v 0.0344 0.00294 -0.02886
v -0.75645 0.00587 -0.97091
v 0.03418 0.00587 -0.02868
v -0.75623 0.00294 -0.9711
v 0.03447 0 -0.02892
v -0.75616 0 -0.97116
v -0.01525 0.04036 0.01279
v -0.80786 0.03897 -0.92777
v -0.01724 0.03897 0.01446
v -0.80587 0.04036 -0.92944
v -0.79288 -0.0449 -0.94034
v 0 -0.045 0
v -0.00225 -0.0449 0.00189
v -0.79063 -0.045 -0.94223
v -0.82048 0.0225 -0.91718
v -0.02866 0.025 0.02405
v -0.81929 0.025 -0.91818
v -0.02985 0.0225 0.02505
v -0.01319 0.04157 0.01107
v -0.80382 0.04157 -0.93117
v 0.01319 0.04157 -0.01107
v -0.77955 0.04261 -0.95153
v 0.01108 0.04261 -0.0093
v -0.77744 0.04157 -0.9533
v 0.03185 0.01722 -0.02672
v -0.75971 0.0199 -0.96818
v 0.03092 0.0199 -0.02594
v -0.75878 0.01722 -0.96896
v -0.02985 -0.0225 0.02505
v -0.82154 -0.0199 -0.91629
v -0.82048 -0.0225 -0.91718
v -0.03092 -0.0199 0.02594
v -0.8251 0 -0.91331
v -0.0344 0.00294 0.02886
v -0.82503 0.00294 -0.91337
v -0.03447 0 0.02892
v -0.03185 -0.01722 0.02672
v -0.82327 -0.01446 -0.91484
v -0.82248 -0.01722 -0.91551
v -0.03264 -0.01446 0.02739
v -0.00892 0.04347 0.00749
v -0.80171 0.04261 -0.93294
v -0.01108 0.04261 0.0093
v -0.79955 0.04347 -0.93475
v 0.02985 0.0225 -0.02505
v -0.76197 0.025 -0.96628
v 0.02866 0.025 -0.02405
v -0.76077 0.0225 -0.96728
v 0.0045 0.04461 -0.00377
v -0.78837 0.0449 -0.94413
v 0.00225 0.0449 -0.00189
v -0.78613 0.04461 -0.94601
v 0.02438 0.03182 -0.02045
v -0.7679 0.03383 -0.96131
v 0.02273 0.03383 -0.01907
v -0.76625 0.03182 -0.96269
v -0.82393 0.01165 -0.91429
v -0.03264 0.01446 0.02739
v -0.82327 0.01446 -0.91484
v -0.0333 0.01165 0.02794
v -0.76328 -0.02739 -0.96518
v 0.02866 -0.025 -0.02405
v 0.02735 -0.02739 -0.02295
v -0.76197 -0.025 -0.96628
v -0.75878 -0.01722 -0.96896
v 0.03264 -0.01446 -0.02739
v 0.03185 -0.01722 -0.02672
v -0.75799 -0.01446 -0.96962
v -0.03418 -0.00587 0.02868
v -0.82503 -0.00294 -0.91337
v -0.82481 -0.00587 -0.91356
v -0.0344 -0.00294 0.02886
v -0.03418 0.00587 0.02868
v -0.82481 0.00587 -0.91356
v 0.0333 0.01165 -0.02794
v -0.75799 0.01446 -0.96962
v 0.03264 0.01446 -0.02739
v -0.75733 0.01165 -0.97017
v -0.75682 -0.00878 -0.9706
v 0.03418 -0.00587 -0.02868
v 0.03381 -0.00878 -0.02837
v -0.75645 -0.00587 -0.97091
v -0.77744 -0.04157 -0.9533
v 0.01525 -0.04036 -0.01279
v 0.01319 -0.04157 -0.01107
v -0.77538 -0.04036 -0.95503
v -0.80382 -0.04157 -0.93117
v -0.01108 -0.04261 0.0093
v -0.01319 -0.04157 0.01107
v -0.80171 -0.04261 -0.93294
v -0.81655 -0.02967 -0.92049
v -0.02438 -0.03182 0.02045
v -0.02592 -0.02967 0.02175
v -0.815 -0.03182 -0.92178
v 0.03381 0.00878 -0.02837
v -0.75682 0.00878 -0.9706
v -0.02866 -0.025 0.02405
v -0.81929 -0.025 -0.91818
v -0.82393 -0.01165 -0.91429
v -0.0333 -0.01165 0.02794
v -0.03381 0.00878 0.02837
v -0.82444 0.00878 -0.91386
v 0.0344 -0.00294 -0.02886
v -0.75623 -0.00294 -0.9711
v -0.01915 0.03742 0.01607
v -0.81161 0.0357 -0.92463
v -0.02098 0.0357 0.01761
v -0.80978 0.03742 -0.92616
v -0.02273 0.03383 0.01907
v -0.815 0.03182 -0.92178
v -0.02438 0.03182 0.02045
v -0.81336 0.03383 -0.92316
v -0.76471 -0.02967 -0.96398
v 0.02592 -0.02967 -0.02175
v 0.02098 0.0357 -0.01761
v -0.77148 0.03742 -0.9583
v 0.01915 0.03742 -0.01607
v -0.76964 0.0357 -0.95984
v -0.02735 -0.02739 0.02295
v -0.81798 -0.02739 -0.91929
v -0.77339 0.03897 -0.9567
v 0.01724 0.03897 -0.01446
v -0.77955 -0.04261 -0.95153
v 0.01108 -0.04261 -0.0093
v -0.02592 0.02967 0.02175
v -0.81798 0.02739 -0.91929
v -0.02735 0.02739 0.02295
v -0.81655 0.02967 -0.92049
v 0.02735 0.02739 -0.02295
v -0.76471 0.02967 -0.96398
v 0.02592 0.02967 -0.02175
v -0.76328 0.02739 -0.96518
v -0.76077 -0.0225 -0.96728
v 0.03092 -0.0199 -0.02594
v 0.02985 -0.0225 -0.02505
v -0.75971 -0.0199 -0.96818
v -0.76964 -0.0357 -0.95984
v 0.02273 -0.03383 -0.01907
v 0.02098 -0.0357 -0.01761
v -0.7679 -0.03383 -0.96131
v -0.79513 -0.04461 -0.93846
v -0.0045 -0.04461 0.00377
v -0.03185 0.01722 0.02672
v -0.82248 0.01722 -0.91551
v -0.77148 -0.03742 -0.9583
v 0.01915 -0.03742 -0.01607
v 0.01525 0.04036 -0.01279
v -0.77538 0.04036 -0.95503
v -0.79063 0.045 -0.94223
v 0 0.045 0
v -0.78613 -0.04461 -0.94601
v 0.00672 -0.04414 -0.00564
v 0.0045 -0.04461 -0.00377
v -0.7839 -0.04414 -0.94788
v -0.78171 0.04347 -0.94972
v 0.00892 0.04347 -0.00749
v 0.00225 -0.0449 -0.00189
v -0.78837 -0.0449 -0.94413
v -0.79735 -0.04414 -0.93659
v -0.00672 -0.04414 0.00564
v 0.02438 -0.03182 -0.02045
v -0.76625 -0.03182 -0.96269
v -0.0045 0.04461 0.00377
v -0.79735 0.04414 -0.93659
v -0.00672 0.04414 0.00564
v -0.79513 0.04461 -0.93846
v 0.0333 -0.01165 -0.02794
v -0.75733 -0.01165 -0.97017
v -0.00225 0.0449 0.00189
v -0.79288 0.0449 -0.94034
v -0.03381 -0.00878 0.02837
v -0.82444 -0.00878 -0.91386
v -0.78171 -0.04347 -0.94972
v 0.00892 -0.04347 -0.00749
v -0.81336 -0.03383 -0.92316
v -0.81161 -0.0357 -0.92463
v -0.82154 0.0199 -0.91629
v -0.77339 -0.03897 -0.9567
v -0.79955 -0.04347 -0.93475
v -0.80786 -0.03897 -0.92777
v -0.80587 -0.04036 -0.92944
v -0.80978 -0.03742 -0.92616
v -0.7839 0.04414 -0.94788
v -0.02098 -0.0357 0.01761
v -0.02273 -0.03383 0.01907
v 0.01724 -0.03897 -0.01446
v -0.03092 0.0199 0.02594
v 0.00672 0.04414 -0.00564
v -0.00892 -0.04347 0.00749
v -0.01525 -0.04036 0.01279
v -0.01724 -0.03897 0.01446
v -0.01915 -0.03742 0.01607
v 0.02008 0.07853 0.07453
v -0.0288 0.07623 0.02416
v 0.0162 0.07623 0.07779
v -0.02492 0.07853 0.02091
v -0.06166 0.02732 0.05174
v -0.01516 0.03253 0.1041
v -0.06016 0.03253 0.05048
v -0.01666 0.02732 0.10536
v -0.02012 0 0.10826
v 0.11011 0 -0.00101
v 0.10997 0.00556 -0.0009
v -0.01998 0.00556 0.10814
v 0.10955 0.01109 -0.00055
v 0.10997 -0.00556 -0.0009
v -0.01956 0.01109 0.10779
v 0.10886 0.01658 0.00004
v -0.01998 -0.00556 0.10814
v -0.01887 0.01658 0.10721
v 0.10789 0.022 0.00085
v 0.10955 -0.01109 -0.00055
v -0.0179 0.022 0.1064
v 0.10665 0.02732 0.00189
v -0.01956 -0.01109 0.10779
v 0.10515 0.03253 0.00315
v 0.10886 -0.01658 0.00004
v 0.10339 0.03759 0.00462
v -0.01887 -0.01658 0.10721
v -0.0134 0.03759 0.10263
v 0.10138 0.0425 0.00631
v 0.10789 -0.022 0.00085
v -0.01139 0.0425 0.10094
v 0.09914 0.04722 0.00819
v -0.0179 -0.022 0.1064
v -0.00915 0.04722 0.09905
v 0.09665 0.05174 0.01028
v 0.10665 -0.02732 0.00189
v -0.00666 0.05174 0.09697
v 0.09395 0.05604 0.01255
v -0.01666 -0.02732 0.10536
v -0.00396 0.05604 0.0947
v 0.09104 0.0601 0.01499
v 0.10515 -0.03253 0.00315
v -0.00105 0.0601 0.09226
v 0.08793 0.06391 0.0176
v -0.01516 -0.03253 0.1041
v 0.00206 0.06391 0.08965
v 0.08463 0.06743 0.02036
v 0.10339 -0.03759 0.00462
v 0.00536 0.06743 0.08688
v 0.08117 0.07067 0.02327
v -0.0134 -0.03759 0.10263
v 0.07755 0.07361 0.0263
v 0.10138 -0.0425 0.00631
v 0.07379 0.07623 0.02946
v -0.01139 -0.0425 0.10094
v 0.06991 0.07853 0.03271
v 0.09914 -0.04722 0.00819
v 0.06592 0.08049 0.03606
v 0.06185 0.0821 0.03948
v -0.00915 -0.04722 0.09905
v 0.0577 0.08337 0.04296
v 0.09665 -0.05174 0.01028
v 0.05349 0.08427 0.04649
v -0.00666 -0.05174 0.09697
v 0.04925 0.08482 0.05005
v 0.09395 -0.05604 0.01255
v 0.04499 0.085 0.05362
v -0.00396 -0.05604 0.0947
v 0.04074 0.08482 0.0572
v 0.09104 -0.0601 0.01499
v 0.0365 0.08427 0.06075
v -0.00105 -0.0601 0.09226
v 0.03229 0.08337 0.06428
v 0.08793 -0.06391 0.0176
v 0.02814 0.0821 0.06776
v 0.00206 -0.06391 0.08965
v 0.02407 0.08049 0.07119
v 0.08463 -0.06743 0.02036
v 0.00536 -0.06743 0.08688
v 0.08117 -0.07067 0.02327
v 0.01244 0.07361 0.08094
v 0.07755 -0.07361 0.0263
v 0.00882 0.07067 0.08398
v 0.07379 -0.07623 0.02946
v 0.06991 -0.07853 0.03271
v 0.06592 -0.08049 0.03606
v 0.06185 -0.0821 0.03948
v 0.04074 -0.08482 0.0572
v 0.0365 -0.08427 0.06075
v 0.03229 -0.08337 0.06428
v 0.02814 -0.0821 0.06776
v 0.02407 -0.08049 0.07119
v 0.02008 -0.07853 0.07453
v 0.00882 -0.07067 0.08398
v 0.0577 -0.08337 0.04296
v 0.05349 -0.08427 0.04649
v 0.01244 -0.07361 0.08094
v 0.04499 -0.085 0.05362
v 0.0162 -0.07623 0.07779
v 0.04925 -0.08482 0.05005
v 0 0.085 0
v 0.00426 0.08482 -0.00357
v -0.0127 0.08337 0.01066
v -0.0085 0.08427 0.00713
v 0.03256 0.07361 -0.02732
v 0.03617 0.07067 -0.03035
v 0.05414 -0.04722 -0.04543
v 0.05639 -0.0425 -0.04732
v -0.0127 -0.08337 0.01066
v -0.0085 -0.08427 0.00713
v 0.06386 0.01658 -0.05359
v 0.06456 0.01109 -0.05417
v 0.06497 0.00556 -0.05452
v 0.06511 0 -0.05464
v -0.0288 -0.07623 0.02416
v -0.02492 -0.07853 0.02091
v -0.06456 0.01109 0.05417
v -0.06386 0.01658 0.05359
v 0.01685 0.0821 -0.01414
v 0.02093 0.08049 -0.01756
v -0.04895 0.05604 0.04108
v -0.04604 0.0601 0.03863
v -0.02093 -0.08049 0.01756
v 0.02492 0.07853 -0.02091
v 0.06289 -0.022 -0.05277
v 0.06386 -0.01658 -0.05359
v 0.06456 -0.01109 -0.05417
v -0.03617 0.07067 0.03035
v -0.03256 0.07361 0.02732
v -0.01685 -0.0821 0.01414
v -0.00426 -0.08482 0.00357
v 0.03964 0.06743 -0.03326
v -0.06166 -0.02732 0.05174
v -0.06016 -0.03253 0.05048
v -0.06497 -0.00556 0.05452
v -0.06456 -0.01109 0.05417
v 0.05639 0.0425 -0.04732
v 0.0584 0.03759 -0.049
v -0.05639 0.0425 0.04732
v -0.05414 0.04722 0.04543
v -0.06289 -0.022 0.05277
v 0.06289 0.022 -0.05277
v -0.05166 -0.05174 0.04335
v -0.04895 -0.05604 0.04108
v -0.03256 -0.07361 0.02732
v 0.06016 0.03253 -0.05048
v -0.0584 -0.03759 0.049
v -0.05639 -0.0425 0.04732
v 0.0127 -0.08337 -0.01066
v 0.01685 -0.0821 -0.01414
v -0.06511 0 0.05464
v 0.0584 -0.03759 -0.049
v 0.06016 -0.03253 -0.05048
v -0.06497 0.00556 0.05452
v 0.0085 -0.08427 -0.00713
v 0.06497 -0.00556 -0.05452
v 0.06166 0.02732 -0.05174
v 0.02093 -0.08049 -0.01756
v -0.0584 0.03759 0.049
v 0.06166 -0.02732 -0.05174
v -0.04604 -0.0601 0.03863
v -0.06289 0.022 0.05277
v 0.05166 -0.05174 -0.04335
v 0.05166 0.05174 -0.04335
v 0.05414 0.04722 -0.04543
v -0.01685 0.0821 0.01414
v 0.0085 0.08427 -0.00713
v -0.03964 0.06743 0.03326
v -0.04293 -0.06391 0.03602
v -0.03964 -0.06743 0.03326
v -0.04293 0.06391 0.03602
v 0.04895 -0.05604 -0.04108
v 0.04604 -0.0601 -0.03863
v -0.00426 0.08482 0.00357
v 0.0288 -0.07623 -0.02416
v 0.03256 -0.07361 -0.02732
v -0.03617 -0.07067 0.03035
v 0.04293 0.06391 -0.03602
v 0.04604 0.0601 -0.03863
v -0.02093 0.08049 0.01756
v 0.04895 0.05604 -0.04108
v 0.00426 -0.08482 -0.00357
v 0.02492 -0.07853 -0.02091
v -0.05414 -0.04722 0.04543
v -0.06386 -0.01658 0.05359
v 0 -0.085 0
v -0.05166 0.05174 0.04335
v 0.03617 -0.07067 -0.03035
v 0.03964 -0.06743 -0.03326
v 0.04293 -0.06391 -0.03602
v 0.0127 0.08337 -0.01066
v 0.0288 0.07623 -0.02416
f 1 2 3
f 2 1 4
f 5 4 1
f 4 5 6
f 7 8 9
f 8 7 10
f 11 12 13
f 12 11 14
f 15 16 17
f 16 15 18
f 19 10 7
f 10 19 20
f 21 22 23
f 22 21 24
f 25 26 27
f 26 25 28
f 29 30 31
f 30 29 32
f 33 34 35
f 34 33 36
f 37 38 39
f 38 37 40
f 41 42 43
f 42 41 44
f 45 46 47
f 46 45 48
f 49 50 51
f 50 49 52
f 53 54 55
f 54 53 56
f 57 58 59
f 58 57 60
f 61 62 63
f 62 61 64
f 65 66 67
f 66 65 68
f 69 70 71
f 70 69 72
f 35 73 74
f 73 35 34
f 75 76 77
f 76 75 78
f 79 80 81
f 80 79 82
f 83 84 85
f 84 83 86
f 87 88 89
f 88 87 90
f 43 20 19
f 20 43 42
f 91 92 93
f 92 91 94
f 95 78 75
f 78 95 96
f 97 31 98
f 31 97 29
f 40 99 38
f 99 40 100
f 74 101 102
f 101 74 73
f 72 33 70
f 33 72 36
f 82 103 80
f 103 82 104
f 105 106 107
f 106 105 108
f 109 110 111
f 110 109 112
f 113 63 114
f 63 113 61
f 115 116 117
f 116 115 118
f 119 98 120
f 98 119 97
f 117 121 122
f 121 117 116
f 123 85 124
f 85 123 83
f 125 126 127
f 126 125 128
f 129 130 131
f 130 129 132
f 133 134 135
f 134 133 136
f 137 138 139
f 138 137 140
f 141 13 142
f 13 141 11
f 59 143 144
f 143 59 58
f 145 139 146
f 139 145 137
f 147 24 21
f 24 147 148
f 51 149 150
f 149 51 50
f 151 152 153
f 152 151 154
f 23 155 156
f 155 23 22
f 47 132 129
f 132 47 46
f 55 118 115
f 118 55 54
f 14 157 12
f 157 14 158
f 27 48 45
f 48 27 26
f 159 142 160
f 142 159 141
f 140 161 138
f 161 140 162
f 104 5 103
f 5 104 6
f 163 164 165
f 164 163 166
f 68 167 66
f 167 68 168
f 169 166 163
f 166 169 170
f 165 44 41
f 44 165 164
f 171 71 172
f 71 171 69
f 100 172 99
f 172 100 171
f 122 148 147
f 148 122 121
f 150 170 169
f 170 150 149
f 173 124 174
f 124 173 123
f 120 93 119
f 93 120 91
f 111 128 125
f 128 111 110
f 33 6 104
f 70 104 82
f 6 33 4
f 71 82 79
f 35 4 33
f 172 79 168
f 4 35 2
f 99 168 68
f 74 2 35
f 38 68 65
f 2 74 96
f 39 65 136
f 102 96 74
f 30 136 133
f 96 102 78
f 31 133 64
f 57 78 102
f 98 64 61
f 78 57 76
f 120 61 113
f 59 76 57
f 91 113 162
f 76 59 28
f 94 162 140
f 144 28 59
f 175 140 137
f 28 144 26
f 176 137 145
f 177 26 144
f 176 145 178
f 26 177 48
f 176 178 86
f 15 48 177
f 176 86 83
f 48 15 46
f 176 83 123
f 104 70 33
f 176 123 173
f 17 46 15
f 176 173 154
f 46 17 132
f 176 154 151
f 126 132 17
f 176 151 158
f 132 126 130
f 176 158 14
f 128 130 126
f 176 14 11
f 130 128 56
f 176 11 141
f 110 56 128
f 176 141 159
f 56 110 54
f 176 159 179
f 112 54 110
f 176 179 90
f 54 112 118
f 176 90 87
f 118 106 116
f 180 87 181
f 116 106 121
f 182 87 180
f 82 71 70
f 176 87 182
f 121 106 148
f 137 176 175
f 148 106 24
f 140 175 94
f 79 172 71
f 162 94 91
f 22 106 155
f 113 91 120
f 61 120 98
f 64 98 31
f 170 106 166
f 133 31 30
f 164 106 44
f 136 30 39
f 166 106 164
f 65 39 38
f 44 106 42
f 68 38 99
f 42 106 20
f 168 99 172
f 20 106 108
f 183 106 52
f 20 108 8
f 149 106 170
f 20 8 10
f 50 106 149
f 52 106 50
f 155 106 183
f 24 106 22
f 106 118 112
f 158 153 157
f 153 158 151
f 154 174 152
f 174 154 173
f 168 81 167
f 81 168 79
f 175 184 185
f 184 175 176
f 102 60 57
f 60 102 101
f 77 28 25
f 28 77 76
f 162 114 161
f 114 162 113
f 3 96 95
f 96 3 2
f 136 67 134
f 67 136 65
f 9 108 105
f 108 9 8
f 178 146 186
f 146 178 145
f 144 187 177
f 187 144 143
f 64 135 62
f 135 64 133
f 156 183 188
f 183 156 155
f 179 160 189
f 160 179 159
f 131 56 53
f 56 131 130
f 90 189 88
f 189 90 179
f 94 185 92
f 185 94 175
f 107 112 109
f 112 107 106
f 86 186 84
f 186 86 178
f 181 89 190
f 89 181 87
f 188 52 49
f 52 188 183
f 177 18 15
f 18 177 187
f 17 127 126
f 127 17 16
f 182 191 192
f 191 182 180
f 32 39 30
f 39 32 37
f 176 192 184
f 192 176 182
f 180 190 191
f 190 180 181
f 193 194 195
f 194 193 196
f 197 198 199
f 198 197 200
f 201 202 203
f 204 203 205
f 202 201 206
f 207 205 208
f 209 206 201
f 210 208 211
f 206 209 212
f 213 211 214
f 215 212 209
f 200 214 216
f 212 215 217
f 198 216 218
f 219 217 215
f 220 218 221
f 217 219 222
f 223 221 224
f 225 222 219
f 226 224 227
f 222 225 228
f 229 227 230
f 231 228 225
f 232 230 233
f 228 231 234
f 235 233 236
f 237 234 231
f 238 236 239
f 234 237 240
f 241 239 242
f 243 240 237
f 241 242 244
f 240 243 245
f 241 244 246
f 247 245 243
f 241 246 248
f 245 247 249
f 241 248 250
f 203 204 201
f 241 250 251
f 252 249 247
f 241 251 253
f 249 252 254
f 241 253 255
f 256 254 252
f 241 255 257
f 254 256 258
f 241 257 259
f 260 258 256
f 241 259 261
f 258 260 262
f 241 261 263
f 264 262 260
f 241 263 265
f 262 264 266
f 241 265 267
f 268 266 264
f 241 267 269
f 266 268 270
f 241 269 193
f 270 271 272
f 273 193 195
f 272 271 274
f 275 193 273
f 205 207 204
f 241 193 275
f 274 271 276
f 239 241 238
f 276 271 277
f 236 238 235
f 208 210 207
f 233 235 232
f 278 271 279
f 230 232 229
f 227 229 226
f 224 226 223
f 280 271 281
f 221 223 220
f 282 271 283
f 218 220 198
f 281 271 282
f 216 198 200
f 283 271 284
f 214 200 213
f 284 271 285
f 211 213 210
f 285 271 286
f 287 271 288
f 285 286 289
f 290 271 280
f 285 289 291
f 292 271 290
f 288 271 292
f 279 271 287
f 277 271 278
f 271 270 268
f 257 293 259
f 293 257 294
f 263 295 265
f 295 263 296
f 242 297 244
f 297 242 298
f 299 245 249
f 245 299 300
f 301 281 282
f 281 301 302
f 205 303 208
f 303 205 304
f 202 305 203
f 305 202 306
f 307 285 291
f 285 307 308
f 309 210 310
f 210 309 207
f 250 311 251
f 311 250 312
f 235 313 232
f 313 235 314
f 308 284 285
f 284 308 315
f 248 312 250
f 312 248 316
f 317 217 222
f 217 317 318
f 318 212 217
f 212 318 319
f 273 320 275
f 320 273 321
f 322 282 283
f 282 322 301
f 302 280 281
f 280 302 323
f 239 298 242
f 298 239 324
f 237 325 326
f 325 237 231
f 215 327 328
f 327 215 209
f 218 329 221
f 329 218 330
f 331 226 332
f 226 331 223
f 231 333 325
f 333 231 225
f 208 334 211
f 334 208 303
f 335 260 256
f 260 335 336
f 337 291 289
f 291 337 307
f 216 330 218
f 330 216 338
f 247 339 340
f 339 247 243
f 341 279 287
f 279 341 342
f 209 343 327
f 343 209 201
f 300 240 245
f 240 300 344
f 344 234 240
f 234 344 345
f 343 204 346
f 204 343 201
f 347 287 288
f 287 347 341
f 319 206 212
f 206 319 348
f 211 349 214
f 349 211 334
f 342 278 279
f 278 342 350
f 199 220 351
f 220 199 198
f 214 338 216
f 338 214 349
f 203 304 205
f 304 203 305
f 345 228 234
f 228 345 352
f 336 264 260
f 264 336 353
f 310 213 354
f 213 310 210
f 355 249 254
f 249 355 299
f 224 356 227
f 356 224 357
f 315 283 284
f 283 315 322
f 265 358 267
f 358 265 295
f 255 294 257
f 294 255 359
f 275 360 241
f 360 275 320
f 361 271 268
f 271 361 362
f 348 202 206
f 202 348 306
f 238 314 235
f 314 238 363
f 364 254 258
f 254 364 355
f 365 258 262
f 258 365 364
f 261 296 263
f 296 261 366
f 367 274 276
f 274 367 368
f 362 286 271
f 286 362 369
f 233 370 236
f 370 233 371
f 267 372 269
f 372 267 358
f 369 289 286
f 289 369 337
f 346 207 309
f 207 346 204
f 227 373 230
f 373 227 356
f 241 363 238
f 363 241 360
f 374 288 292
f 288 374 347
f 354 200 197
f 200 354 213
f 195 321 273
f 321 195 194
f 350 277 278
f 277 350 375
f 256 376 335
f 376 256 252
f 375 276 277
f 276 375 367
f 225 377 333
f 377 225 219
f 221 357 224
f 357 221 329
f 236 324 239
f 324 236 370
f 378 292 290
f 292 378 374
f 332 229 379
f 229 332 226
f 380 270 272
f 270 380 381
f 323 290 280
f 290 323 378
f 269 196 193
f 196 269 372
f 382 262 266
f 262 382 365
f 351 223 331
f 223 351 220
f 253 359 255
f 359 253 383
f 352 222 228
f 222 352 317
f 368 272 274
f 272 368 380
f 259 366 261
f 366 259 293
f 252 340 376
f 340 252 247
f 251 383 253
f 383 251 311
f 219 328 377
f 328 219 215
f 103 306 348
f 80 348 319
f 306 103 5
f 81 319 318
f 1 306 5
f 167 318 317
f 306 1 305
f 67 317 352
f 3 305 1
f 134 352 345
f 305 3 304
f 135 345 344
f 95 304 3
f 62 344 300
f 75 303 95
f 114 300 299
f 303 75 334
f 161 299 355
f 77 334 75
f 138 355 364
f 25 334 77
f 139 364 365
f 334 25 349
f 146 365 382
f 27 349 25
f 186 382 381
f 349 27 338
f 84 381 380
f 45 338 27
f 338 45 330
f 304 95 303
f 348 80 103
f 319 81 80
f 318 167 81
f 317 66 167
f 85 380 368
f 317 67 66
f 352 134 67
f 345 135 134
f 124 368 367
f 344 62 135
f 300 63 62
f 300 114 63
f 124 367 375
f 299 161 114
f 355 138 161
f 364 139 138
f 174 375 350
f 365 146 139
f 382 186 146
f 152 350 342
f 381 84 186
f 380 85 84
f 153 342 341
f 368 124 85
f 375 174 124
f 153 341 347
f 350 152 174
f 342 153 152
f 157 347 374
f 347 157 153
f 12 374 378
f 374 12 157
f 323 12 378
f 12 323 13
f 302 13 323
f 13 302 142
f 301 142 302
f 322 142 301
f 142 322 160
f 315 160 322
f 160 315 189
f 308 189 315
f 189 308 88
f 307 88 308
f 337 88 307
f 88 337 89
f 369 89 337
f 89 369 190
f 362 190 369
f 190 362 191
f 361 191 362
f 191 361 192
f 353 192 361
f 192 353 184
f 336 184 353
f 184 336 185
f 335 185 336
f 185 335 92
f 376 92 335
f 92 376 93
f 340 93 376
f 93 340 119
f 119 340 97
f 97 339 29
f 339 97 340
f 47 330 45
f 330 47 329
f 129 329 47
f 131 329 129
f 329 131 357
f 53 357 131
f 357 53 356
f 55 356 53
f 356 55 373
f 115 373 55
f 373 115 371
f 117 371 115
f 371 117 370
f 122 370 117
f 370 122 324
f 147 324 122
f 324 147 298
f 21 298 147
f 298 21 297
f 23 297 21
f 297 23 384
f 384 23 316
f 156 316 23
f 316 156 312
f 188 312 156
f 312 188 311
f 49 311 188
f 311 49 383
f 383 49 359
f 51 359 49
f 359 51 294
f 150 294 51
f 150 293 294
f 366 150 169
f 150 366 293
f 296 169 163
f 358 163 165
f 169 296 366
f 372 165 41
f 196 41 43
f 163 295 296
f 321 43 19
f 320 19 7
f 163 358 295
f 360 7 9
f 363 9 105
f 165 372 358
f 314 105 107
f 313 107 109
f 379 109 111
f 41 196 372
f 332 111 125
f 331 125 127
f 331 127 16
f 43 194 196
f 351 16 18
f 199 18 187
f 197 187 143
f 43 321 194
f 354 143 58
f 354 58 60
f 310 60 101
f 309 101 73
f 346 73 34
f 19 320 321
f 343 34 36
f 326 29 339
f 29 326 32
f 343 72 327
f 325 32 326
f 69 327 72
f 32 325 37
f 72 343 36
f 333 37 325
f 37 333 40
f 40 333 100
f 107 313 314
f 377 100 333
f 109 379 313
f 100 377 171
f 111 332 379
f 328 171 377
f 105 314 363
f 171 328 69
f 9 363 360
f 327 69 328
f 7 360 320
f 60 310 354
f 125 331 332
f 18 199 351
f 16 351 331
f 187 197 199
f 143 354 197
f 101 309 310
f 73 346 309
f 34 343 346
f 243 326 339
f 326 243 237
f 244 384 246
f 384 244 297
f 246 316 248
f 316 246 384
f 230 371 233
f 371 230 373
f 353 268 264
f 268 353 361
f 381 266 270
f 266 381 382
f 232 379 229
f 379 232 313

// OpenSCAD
// CylinderMesh.Create(false,true): 96 segments; radii .045 and .085; heights -1.23,.03,0,.07 m.
$fn=96; rotate([0,40,0]) color("#8E9296") { translate([0,0,-1.23]) cylinder(r=.045,h=1.26); cylinder(r=.085,h=.07); }
